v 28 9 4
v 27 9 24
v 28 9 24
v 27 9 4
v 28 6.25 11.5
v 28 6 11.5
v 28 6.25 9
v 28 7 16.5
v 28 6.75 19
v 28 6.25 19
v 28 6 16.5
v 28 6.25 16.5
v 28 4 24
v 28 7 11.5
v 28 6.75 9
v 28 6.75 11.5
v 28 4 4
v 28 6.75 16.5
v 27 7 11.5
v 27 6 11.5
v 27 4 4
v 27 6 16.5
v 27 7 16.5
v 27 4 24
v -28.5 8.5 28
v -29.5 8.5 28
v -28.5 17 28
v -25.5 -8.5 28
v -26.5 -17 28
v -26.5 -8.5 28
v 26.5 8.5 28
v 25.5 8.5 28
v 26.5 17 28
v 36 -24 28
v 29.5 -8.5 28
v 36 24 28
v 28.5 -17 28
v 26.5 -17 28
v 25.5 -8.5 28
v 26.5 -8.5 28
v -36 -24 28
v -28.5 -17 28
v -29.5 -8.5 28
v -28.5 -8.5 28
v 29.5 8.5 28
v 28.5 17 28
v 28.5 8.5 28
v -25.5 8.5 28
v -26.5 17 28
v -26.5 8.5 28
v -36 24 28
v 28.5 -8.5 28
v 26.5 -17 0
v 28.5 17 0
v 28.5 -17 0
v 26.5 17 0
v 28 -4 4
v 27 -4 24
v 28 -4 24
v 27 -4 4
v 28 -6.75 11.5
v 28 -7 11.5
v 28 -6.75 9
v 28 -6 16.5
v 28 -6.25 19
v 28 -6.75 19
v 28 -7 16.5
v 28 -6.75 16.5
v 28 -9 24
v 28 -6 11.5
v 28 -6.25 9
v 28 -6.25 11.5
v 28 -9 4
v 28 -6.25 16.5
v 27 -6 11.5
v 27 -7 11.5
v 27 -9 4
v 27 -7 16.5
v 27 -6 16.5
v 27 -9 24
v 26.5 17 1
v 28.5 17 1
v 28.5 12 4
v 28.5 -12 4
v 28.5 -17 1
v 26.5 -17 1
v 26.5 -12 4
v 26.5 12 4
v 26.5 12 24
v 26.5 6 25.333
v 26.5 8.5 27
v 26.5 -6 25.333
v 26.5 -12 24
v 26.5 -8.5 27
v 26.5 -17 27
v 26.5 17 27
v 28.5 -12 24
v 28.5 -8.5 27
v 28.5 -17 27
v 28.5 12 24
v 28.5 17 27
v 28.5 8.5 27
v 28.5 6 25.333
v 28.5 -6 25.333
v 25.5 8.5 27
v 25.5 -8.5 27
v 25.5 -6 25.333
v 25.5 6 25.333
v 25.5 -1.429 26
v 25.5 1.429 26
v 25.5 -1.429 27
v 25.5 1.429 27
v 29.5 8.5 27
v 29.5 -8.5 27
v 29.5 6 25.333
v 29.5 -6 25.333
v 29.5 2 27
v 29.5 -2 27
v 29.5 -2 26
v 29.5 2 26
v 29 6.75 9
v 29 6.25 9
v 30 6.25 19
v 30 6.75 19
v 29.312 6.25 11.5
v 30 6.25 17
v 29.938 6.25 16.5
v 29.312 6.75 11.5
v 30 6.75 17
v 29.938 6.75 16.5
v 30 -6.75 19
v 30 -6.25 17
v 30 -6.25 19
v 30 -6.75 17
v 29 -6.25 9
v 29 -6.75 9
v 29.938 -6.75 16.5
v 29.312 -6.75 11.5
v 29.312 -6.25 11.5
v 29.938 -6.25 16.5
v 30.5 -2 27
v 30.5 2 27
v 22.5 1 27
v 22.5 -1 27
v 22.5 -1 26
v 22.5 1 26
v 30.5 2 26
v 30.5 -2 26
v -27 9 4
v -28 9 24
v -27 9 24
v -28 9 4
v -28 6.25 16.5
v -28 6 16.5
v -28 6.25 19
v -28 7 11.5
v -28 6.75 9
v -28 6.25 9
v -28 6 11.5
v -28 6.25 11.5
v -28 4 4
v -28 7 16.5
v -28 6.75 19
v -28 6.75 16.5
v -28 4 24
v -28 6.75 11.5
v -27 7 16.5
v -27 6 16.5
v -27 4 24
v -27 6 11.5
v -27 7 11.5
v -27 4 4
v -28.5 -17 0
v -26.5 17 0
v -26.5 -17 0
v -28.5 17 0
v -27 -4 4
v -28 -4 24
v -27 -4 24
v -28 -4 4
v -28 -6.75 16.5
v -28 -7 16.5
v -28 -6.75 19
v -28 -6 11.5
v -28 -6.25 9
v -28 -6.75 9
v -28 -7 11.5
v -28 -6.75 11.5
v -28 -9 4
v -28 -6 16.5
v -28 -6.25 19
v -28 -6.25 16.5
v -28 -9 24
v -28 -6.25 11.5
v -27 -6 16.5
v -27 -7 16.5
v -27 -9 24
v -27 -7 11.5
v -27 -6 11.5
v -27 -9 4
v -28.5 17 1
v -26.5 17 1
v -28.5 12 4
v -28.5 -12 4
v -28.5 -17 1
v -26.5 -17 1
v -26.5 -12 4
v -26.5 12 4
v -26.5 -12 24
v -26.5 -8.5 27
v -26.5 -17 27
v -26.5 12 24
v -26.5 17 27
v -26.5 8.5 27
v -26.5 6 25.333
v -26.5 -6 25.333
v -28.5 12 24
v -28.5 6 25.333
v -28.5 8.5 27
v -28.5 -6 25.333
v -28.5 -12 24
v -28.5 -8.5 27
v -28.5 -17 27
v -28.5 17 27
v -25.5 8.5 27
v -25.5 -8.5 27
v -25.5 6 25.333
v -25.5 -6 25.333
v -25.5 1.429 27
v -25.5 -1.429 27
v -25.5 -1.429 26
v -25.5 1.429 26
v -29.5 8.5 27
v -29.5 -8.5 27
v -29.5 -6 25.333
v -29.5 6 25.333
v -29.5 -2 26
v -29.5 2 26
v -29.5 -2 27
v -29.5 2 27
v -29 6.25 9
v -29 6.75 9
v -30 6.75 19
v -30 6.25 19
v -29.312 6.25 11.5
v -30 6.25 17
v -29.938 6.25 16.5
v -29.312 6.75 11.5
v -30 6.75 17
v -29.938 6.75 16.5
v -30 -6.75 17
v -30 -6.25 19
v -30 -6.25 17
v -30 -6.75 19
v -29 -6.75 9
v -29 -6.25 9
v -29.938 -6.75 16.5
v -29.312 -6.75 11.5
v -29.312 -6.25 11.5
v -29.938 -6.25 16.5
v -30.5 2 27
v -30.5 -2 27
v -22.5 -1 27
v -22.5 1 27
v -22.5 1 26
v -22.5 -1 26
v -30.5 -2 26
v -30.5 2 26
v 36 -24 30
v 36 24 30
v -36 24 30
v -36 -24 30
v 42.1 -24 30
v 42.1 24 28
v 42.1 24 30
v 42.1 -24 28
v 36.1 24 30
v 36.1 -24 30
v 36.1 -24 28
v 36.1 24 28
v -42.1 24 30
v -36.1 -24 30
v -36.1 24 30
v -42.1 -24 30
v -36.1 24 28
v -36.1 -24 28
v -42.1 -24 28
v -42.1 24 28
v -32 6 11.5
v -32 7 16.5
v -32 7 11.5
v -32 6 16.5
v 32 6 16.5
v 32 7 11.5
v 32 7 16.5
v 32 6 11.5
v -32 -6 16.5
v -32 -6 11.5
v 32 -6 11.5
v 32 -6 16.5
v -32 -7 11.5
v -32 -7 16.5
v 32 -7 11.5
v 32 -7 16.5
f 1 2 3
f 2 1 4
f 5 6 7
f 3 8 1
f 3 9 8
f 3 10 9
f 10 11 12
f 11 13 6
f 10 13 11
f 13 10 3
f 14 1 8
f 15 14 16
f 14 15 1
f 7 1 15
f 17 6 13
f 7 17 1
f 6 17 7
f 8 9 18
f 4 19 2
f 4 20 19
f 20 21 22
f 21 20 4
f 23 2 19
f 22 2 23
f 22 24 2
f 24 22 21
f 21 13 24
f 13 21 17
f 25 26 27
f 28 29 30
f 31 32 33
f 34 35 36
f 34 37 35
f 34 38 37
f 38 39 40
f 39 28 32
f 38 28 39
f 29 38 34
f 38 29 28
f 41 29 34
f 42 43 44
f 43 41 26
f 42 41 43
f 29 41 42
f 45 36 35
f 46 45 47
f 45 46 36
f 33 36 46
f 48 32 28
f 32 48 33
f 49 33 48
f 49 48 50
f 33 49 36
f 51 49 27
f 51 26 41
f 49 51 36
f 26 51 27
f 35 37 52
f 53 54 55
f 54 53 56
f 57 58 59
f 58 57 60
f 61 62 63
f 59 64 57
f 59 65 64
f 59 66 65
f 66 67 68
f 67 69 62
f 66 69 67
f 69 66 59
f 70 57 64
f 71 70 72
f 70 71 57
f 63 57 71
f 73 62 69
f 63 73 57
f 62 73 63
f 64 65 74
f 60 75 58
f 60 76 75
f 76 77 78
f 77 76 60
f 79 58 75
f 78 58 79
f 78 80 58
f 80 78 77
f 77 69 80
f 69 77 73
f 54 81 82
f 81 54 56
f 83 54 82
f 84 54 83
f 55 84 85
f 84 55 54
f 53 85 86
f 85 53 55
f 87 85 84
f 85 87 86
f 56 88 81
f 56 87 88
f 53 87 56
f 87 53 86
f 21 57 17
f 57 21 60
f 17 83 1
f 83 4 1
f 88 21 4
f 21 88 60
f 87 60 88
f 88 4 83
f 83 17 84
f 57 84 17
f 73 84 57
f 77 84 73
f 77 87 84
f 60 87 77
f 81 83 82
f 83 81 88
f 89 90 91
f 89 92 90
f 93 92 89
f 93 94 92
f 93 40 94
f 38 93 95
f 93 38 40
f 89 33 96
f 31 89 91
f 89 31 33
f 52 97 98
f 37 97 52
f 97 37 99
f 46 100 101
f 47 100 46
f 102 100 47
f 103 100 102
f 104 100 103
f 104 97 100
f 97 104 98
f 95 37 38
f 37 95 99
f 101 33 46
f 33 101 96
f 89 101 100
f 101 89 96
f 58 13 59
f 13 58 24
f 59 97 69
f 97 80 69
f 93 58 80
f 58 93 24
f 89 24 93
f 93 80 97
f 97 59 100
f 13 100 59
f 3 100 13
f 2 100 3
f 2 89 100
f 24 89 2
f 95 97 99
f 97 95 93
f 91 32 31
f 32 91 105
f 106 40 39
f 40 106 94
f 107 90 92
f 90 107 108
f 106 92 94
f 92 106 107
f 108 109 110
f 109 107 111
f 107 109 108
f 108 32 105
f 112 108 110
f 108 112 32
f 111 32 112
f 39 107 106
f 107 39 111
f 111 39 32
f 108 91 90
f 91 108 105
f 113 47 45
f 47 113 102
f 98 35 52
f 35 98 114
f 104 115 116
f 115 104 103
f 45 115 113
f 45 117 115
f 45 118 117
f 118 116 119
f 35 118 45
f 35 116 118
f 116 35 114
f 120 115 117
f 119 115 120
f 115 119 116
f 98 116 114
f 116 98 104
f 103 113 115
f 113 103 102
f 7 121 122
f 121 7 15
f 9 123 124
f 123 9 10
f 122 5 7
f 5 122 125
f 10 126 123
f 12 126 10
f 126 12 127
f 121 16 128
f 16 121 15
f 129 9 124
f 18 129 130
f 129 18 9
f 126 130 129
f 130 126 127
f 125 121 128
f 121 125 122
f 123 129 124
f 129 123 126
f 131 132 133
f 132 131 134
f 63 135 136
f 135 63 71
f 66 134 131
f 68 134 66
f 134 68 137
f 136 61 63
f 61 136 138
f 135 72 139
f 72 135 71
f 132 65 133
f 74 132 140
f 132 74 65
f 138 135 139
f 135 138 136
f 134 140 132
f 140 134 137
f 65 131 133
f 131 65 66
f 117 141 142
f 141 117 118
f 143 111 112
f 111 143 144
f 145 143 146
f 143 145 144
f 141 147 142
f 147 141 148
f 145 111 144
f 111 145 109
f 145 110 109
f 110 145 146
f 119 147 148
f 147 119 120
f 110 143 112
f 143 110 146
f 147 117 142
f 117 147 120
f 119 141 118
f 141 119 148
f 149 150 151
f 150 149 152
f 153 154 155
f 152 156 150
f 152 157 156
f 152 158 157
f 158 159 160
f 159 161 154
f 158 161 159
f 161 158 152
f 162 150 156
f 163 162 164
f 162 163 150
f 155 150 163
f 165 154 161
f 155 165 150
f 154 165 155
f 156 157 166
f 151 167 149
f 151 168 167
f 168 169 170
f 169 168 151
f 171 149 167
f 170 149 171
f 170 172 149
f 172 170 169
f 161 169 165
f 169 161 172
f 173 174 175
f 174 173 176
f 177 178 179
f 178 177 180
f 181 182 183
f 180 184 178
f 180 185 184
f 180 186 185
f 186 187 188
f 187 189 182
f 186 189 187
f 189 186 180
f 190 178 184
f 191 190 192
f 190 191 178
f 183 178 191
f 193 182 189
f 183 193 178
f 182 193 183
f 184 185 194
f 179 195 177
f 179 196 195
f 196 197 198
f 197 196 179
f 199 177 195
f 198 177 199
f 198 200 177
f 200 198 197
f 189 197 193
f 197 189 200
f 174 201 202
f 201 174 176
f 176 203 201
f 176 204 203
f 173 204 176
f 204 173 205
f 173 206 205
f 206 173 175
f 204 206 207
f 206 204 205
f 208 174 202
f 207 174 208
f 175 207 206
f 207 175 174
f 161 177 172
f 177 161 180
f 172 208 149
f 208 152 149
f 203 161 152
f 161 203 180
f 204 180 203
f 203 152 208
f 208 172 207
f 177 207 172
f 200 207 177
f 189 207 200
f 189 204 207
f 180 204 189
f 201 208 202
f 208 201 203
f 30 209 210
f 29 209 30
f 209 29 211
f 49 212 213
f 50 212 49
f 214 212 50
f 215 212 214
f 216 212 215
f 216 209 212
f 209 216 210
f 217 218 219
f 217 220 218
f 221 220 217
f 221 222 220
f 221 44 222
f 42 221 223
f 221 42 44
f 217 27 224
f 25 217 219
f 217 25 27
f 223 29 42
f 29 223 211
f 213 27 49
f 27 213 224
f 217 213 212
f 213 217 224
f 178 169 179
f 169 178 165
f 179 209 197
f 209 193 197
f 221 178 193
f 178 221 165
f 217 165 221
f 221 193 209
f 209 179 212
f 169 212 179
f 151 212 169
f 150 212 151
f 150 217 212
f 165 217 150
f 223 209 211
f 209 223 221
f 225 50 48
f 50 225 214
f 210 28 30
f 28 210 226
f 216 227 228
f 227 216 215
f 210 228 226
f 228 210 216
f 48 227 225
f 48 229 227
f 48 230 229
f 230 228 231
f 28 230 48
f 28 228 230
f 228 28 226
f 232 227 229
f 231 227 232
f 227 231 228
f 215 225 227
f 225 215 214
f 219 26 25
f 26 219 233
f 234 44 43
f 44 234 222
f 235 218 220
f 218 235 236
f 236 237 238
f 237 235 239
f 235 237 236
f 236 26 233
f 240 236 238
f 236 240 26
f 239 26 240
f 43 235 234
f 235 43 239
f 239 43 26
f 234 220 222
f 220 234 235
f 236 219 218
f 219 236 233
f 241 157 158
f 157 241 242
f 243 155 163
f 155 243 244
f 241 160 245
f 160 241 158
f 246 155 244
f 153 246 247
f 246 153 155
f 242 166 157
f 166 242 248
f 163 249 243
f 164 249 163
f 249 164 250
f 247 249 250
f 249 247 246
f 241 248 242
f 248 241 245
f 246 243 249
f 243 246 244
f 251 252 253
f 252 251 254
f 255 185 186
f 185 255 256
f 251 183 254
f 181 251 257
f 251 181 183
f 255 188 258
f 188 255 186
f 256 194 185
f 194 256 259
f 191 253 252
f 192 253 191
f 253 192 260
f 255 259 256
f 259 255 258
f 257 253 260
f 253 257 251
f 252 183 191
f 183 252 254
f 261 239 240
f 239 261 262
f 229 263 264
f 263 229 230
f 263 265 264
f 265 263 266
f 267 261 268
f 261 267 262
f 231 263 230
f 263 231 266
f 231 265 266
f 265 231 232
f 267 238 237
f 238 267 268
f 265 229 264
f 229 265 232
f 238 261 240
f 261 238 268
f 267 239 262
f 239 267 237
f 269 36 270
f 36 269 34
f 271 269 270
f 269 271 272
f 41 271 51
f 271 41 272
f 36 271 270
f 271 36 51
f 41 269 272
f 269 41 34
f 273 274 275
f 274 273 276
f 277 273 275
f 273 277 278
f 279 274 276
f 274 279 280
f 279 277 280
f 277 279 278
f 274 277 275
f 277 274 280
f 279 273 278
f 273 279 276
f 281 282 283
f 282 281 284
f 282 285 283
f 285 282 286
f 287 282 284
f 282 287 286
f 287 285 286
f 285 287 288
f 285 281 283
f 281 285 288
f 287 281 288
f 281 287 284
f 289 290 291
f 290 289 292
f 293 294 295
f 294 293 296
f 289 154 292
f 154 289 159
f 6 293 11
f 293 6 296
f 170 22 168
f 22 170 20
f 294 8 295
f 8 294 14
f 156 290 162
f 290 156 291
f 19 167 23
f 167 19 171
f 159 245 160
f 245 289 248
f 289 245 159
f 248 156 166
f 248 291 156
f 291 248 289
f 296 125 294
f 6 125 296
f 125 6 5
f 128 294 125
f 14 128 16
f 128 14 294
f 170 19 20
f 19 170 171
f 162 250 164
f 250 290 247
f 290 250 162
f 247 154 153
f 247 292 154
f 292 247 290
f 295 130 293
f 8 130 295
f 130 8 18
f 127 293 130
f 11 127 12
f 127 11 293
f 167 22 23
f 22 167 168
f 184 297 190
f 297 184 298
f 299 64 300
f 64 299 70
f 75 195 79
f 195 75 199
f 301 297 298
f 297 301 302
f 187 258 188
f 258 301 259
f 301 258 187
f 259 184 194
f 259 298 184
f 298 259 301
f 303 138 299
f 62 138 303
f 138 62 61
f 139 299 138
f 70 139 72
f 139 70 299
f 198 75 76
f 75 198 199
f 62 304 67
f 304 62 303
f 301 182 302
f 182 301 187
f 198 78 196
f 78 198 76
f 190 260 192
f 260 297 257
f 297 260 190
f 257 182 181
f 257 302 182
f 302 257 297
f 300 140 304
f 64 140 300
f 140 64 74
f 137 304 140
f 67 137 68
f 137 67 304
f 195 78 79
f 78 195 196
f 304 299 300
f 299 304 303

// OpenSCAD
feet = 12;

table_width = 7 * feet;
table_depth = 4 * feet;
table_height = 30;
table_thickness = 2;
breadboard_width = 6;
leg_thickness = 1;
leg_width = 5;
leg_separation = 8;
truss_height = 5;
truss_thickness = leg_thickness;
truss_extension = 3;
foot_height = 4;
foot_thickness = 2;

leg_height = table_height - table_thickness;
leg_offset = leg_height / 2;
truss_offset = leg_height / 2;
foot_width = table_depth - leg_offset;

// table top
translate([0, 0, leg_height + table_thickness / 2])
cube([table_width - breadboard_width * 2, table_depth, table_thickness], true);

// breadboards
module breadboard() {
  translate([table_width / 2 - breadboard_width / 2 + 0.1, 0, leg_height + table_thickness / 2])
    cube([breadboard_width, table_depth, table_thickness], true);
}

module x_leg() {
  rotate([90, 0, 90])
    translate([0, leg_height / 2, table_width / 2 - leg_offset - leg_thickness / 2])
    cube([leg_width, leg_height, leg_thickness], true);
}

module sloped(cube, slope_width, slope_height, center = true) {
  x = cube[0];
  y = cube[1];
  z = cube[2];
  rotate([90, 0, 0])
  linear_extrude(height = z, center = false)
  translate([
    center ? -x / 2 : 0,
    center ? -y / 2 : 0,
    center ? -z / 2 : 0
  ])
  polygon([
    [0, 0],
    [0, slope_height],
    [slope_width, y],
    [x - slope_width, y],
    [x, slope_height],
    [x, 0]
  ]);
}

module wedge(cube, slope_width, slope_height, center = true) {
  x = cube[0];
  y = cube[1];
  z = cube[2];
  rotate([90, 0, 0])
  linear_extrude(height = z, center = false)
  translate([
    center ? -x / 2 : 0,
    center ? -y / 2 : 0,
    center ? -z / 2 : 0
  ])
  polygon([
    [0, 0],
    [0, slope_height],
    [slope_width, y],
    [x, y],
    [x, 0]
  ]);
}

module leg_wedge() {
  wedge_dims = [truss_height * 2, truss_extension - 1, truss_thickness / 2];
  translate([table_width / 2 - leg_offset + wedge_dims[1] / 2, leg_separation / 2 + leg_width / 2 - wedge_dims[2] / 2, truss_offset])
  rotate([0, 270, 180])
  wedge(wedge_dims, wedge_dims[0] - 2, 1);
}

module table_wedge() {
  dims = [4, (leg_thickness * 2 + foot_thickness) * 2, truss_thickness];
  translate([table_width / 2 - leg_offset - leg_thickness / 2 - foot_thickness / 2, 0, leg_height - 1])
  rotate([90, 0, -90])
  sloped(dims, dims[0] / 4, 1);
}

module foot() {
  translate([table_width / 2 - leg_offset - leg_thickness / 2 - foot_thickness / 2, 0, foot_height / 2])
  rotate([0, 0, 90])
  sloped([foot_width, foot_height, foot_thickness], 5, 1);
}

module glide() {
  glide_height = foot_height / 1.5;
  translate([table_width / 2 - leg_offset - leg_thickness / 2 - foot_thickness / 2, 0, leg_height - glide_height / 2])
  rotate([180, 0, 90])
  sloped([foot_width / 2, glide_height, leg_thickness], 2.5, 1);
}

module leg() {
  leg_separation_x = leg_separation / 2 + leg_width / 2;
  translate([0, leg_separation_x, 0])
  x_leg();
  translate([0, -leg_separation_x, 0])
  x_leg();
  foot();
  translate([0, 0, leg_height])
    rotate([180, 0, 0])
    foot();
  glide();
  translate([foot_thickness + leg_thickness, 0, 0])
  glide();
  leg_wedge();
  mirror([0, 1, 0]) leg_wedge();
  table_wedge();
}

module truss() {
  translate([0, leg_separation / 2 + leg_width / 2, truss_offset])
  rotate([90, 0, 0])
  cube([table_width - leg_offset * 2 + leg_thickness * 2 + truss_extension * 2, truss_height, truss_thickness], true);
}

breadboard();
mirror([1, 0, 0]) breadboard();

leg();
mirror([1, 0, 0]) leg();

truss();
mirror([0, 1, 0]) truss();
